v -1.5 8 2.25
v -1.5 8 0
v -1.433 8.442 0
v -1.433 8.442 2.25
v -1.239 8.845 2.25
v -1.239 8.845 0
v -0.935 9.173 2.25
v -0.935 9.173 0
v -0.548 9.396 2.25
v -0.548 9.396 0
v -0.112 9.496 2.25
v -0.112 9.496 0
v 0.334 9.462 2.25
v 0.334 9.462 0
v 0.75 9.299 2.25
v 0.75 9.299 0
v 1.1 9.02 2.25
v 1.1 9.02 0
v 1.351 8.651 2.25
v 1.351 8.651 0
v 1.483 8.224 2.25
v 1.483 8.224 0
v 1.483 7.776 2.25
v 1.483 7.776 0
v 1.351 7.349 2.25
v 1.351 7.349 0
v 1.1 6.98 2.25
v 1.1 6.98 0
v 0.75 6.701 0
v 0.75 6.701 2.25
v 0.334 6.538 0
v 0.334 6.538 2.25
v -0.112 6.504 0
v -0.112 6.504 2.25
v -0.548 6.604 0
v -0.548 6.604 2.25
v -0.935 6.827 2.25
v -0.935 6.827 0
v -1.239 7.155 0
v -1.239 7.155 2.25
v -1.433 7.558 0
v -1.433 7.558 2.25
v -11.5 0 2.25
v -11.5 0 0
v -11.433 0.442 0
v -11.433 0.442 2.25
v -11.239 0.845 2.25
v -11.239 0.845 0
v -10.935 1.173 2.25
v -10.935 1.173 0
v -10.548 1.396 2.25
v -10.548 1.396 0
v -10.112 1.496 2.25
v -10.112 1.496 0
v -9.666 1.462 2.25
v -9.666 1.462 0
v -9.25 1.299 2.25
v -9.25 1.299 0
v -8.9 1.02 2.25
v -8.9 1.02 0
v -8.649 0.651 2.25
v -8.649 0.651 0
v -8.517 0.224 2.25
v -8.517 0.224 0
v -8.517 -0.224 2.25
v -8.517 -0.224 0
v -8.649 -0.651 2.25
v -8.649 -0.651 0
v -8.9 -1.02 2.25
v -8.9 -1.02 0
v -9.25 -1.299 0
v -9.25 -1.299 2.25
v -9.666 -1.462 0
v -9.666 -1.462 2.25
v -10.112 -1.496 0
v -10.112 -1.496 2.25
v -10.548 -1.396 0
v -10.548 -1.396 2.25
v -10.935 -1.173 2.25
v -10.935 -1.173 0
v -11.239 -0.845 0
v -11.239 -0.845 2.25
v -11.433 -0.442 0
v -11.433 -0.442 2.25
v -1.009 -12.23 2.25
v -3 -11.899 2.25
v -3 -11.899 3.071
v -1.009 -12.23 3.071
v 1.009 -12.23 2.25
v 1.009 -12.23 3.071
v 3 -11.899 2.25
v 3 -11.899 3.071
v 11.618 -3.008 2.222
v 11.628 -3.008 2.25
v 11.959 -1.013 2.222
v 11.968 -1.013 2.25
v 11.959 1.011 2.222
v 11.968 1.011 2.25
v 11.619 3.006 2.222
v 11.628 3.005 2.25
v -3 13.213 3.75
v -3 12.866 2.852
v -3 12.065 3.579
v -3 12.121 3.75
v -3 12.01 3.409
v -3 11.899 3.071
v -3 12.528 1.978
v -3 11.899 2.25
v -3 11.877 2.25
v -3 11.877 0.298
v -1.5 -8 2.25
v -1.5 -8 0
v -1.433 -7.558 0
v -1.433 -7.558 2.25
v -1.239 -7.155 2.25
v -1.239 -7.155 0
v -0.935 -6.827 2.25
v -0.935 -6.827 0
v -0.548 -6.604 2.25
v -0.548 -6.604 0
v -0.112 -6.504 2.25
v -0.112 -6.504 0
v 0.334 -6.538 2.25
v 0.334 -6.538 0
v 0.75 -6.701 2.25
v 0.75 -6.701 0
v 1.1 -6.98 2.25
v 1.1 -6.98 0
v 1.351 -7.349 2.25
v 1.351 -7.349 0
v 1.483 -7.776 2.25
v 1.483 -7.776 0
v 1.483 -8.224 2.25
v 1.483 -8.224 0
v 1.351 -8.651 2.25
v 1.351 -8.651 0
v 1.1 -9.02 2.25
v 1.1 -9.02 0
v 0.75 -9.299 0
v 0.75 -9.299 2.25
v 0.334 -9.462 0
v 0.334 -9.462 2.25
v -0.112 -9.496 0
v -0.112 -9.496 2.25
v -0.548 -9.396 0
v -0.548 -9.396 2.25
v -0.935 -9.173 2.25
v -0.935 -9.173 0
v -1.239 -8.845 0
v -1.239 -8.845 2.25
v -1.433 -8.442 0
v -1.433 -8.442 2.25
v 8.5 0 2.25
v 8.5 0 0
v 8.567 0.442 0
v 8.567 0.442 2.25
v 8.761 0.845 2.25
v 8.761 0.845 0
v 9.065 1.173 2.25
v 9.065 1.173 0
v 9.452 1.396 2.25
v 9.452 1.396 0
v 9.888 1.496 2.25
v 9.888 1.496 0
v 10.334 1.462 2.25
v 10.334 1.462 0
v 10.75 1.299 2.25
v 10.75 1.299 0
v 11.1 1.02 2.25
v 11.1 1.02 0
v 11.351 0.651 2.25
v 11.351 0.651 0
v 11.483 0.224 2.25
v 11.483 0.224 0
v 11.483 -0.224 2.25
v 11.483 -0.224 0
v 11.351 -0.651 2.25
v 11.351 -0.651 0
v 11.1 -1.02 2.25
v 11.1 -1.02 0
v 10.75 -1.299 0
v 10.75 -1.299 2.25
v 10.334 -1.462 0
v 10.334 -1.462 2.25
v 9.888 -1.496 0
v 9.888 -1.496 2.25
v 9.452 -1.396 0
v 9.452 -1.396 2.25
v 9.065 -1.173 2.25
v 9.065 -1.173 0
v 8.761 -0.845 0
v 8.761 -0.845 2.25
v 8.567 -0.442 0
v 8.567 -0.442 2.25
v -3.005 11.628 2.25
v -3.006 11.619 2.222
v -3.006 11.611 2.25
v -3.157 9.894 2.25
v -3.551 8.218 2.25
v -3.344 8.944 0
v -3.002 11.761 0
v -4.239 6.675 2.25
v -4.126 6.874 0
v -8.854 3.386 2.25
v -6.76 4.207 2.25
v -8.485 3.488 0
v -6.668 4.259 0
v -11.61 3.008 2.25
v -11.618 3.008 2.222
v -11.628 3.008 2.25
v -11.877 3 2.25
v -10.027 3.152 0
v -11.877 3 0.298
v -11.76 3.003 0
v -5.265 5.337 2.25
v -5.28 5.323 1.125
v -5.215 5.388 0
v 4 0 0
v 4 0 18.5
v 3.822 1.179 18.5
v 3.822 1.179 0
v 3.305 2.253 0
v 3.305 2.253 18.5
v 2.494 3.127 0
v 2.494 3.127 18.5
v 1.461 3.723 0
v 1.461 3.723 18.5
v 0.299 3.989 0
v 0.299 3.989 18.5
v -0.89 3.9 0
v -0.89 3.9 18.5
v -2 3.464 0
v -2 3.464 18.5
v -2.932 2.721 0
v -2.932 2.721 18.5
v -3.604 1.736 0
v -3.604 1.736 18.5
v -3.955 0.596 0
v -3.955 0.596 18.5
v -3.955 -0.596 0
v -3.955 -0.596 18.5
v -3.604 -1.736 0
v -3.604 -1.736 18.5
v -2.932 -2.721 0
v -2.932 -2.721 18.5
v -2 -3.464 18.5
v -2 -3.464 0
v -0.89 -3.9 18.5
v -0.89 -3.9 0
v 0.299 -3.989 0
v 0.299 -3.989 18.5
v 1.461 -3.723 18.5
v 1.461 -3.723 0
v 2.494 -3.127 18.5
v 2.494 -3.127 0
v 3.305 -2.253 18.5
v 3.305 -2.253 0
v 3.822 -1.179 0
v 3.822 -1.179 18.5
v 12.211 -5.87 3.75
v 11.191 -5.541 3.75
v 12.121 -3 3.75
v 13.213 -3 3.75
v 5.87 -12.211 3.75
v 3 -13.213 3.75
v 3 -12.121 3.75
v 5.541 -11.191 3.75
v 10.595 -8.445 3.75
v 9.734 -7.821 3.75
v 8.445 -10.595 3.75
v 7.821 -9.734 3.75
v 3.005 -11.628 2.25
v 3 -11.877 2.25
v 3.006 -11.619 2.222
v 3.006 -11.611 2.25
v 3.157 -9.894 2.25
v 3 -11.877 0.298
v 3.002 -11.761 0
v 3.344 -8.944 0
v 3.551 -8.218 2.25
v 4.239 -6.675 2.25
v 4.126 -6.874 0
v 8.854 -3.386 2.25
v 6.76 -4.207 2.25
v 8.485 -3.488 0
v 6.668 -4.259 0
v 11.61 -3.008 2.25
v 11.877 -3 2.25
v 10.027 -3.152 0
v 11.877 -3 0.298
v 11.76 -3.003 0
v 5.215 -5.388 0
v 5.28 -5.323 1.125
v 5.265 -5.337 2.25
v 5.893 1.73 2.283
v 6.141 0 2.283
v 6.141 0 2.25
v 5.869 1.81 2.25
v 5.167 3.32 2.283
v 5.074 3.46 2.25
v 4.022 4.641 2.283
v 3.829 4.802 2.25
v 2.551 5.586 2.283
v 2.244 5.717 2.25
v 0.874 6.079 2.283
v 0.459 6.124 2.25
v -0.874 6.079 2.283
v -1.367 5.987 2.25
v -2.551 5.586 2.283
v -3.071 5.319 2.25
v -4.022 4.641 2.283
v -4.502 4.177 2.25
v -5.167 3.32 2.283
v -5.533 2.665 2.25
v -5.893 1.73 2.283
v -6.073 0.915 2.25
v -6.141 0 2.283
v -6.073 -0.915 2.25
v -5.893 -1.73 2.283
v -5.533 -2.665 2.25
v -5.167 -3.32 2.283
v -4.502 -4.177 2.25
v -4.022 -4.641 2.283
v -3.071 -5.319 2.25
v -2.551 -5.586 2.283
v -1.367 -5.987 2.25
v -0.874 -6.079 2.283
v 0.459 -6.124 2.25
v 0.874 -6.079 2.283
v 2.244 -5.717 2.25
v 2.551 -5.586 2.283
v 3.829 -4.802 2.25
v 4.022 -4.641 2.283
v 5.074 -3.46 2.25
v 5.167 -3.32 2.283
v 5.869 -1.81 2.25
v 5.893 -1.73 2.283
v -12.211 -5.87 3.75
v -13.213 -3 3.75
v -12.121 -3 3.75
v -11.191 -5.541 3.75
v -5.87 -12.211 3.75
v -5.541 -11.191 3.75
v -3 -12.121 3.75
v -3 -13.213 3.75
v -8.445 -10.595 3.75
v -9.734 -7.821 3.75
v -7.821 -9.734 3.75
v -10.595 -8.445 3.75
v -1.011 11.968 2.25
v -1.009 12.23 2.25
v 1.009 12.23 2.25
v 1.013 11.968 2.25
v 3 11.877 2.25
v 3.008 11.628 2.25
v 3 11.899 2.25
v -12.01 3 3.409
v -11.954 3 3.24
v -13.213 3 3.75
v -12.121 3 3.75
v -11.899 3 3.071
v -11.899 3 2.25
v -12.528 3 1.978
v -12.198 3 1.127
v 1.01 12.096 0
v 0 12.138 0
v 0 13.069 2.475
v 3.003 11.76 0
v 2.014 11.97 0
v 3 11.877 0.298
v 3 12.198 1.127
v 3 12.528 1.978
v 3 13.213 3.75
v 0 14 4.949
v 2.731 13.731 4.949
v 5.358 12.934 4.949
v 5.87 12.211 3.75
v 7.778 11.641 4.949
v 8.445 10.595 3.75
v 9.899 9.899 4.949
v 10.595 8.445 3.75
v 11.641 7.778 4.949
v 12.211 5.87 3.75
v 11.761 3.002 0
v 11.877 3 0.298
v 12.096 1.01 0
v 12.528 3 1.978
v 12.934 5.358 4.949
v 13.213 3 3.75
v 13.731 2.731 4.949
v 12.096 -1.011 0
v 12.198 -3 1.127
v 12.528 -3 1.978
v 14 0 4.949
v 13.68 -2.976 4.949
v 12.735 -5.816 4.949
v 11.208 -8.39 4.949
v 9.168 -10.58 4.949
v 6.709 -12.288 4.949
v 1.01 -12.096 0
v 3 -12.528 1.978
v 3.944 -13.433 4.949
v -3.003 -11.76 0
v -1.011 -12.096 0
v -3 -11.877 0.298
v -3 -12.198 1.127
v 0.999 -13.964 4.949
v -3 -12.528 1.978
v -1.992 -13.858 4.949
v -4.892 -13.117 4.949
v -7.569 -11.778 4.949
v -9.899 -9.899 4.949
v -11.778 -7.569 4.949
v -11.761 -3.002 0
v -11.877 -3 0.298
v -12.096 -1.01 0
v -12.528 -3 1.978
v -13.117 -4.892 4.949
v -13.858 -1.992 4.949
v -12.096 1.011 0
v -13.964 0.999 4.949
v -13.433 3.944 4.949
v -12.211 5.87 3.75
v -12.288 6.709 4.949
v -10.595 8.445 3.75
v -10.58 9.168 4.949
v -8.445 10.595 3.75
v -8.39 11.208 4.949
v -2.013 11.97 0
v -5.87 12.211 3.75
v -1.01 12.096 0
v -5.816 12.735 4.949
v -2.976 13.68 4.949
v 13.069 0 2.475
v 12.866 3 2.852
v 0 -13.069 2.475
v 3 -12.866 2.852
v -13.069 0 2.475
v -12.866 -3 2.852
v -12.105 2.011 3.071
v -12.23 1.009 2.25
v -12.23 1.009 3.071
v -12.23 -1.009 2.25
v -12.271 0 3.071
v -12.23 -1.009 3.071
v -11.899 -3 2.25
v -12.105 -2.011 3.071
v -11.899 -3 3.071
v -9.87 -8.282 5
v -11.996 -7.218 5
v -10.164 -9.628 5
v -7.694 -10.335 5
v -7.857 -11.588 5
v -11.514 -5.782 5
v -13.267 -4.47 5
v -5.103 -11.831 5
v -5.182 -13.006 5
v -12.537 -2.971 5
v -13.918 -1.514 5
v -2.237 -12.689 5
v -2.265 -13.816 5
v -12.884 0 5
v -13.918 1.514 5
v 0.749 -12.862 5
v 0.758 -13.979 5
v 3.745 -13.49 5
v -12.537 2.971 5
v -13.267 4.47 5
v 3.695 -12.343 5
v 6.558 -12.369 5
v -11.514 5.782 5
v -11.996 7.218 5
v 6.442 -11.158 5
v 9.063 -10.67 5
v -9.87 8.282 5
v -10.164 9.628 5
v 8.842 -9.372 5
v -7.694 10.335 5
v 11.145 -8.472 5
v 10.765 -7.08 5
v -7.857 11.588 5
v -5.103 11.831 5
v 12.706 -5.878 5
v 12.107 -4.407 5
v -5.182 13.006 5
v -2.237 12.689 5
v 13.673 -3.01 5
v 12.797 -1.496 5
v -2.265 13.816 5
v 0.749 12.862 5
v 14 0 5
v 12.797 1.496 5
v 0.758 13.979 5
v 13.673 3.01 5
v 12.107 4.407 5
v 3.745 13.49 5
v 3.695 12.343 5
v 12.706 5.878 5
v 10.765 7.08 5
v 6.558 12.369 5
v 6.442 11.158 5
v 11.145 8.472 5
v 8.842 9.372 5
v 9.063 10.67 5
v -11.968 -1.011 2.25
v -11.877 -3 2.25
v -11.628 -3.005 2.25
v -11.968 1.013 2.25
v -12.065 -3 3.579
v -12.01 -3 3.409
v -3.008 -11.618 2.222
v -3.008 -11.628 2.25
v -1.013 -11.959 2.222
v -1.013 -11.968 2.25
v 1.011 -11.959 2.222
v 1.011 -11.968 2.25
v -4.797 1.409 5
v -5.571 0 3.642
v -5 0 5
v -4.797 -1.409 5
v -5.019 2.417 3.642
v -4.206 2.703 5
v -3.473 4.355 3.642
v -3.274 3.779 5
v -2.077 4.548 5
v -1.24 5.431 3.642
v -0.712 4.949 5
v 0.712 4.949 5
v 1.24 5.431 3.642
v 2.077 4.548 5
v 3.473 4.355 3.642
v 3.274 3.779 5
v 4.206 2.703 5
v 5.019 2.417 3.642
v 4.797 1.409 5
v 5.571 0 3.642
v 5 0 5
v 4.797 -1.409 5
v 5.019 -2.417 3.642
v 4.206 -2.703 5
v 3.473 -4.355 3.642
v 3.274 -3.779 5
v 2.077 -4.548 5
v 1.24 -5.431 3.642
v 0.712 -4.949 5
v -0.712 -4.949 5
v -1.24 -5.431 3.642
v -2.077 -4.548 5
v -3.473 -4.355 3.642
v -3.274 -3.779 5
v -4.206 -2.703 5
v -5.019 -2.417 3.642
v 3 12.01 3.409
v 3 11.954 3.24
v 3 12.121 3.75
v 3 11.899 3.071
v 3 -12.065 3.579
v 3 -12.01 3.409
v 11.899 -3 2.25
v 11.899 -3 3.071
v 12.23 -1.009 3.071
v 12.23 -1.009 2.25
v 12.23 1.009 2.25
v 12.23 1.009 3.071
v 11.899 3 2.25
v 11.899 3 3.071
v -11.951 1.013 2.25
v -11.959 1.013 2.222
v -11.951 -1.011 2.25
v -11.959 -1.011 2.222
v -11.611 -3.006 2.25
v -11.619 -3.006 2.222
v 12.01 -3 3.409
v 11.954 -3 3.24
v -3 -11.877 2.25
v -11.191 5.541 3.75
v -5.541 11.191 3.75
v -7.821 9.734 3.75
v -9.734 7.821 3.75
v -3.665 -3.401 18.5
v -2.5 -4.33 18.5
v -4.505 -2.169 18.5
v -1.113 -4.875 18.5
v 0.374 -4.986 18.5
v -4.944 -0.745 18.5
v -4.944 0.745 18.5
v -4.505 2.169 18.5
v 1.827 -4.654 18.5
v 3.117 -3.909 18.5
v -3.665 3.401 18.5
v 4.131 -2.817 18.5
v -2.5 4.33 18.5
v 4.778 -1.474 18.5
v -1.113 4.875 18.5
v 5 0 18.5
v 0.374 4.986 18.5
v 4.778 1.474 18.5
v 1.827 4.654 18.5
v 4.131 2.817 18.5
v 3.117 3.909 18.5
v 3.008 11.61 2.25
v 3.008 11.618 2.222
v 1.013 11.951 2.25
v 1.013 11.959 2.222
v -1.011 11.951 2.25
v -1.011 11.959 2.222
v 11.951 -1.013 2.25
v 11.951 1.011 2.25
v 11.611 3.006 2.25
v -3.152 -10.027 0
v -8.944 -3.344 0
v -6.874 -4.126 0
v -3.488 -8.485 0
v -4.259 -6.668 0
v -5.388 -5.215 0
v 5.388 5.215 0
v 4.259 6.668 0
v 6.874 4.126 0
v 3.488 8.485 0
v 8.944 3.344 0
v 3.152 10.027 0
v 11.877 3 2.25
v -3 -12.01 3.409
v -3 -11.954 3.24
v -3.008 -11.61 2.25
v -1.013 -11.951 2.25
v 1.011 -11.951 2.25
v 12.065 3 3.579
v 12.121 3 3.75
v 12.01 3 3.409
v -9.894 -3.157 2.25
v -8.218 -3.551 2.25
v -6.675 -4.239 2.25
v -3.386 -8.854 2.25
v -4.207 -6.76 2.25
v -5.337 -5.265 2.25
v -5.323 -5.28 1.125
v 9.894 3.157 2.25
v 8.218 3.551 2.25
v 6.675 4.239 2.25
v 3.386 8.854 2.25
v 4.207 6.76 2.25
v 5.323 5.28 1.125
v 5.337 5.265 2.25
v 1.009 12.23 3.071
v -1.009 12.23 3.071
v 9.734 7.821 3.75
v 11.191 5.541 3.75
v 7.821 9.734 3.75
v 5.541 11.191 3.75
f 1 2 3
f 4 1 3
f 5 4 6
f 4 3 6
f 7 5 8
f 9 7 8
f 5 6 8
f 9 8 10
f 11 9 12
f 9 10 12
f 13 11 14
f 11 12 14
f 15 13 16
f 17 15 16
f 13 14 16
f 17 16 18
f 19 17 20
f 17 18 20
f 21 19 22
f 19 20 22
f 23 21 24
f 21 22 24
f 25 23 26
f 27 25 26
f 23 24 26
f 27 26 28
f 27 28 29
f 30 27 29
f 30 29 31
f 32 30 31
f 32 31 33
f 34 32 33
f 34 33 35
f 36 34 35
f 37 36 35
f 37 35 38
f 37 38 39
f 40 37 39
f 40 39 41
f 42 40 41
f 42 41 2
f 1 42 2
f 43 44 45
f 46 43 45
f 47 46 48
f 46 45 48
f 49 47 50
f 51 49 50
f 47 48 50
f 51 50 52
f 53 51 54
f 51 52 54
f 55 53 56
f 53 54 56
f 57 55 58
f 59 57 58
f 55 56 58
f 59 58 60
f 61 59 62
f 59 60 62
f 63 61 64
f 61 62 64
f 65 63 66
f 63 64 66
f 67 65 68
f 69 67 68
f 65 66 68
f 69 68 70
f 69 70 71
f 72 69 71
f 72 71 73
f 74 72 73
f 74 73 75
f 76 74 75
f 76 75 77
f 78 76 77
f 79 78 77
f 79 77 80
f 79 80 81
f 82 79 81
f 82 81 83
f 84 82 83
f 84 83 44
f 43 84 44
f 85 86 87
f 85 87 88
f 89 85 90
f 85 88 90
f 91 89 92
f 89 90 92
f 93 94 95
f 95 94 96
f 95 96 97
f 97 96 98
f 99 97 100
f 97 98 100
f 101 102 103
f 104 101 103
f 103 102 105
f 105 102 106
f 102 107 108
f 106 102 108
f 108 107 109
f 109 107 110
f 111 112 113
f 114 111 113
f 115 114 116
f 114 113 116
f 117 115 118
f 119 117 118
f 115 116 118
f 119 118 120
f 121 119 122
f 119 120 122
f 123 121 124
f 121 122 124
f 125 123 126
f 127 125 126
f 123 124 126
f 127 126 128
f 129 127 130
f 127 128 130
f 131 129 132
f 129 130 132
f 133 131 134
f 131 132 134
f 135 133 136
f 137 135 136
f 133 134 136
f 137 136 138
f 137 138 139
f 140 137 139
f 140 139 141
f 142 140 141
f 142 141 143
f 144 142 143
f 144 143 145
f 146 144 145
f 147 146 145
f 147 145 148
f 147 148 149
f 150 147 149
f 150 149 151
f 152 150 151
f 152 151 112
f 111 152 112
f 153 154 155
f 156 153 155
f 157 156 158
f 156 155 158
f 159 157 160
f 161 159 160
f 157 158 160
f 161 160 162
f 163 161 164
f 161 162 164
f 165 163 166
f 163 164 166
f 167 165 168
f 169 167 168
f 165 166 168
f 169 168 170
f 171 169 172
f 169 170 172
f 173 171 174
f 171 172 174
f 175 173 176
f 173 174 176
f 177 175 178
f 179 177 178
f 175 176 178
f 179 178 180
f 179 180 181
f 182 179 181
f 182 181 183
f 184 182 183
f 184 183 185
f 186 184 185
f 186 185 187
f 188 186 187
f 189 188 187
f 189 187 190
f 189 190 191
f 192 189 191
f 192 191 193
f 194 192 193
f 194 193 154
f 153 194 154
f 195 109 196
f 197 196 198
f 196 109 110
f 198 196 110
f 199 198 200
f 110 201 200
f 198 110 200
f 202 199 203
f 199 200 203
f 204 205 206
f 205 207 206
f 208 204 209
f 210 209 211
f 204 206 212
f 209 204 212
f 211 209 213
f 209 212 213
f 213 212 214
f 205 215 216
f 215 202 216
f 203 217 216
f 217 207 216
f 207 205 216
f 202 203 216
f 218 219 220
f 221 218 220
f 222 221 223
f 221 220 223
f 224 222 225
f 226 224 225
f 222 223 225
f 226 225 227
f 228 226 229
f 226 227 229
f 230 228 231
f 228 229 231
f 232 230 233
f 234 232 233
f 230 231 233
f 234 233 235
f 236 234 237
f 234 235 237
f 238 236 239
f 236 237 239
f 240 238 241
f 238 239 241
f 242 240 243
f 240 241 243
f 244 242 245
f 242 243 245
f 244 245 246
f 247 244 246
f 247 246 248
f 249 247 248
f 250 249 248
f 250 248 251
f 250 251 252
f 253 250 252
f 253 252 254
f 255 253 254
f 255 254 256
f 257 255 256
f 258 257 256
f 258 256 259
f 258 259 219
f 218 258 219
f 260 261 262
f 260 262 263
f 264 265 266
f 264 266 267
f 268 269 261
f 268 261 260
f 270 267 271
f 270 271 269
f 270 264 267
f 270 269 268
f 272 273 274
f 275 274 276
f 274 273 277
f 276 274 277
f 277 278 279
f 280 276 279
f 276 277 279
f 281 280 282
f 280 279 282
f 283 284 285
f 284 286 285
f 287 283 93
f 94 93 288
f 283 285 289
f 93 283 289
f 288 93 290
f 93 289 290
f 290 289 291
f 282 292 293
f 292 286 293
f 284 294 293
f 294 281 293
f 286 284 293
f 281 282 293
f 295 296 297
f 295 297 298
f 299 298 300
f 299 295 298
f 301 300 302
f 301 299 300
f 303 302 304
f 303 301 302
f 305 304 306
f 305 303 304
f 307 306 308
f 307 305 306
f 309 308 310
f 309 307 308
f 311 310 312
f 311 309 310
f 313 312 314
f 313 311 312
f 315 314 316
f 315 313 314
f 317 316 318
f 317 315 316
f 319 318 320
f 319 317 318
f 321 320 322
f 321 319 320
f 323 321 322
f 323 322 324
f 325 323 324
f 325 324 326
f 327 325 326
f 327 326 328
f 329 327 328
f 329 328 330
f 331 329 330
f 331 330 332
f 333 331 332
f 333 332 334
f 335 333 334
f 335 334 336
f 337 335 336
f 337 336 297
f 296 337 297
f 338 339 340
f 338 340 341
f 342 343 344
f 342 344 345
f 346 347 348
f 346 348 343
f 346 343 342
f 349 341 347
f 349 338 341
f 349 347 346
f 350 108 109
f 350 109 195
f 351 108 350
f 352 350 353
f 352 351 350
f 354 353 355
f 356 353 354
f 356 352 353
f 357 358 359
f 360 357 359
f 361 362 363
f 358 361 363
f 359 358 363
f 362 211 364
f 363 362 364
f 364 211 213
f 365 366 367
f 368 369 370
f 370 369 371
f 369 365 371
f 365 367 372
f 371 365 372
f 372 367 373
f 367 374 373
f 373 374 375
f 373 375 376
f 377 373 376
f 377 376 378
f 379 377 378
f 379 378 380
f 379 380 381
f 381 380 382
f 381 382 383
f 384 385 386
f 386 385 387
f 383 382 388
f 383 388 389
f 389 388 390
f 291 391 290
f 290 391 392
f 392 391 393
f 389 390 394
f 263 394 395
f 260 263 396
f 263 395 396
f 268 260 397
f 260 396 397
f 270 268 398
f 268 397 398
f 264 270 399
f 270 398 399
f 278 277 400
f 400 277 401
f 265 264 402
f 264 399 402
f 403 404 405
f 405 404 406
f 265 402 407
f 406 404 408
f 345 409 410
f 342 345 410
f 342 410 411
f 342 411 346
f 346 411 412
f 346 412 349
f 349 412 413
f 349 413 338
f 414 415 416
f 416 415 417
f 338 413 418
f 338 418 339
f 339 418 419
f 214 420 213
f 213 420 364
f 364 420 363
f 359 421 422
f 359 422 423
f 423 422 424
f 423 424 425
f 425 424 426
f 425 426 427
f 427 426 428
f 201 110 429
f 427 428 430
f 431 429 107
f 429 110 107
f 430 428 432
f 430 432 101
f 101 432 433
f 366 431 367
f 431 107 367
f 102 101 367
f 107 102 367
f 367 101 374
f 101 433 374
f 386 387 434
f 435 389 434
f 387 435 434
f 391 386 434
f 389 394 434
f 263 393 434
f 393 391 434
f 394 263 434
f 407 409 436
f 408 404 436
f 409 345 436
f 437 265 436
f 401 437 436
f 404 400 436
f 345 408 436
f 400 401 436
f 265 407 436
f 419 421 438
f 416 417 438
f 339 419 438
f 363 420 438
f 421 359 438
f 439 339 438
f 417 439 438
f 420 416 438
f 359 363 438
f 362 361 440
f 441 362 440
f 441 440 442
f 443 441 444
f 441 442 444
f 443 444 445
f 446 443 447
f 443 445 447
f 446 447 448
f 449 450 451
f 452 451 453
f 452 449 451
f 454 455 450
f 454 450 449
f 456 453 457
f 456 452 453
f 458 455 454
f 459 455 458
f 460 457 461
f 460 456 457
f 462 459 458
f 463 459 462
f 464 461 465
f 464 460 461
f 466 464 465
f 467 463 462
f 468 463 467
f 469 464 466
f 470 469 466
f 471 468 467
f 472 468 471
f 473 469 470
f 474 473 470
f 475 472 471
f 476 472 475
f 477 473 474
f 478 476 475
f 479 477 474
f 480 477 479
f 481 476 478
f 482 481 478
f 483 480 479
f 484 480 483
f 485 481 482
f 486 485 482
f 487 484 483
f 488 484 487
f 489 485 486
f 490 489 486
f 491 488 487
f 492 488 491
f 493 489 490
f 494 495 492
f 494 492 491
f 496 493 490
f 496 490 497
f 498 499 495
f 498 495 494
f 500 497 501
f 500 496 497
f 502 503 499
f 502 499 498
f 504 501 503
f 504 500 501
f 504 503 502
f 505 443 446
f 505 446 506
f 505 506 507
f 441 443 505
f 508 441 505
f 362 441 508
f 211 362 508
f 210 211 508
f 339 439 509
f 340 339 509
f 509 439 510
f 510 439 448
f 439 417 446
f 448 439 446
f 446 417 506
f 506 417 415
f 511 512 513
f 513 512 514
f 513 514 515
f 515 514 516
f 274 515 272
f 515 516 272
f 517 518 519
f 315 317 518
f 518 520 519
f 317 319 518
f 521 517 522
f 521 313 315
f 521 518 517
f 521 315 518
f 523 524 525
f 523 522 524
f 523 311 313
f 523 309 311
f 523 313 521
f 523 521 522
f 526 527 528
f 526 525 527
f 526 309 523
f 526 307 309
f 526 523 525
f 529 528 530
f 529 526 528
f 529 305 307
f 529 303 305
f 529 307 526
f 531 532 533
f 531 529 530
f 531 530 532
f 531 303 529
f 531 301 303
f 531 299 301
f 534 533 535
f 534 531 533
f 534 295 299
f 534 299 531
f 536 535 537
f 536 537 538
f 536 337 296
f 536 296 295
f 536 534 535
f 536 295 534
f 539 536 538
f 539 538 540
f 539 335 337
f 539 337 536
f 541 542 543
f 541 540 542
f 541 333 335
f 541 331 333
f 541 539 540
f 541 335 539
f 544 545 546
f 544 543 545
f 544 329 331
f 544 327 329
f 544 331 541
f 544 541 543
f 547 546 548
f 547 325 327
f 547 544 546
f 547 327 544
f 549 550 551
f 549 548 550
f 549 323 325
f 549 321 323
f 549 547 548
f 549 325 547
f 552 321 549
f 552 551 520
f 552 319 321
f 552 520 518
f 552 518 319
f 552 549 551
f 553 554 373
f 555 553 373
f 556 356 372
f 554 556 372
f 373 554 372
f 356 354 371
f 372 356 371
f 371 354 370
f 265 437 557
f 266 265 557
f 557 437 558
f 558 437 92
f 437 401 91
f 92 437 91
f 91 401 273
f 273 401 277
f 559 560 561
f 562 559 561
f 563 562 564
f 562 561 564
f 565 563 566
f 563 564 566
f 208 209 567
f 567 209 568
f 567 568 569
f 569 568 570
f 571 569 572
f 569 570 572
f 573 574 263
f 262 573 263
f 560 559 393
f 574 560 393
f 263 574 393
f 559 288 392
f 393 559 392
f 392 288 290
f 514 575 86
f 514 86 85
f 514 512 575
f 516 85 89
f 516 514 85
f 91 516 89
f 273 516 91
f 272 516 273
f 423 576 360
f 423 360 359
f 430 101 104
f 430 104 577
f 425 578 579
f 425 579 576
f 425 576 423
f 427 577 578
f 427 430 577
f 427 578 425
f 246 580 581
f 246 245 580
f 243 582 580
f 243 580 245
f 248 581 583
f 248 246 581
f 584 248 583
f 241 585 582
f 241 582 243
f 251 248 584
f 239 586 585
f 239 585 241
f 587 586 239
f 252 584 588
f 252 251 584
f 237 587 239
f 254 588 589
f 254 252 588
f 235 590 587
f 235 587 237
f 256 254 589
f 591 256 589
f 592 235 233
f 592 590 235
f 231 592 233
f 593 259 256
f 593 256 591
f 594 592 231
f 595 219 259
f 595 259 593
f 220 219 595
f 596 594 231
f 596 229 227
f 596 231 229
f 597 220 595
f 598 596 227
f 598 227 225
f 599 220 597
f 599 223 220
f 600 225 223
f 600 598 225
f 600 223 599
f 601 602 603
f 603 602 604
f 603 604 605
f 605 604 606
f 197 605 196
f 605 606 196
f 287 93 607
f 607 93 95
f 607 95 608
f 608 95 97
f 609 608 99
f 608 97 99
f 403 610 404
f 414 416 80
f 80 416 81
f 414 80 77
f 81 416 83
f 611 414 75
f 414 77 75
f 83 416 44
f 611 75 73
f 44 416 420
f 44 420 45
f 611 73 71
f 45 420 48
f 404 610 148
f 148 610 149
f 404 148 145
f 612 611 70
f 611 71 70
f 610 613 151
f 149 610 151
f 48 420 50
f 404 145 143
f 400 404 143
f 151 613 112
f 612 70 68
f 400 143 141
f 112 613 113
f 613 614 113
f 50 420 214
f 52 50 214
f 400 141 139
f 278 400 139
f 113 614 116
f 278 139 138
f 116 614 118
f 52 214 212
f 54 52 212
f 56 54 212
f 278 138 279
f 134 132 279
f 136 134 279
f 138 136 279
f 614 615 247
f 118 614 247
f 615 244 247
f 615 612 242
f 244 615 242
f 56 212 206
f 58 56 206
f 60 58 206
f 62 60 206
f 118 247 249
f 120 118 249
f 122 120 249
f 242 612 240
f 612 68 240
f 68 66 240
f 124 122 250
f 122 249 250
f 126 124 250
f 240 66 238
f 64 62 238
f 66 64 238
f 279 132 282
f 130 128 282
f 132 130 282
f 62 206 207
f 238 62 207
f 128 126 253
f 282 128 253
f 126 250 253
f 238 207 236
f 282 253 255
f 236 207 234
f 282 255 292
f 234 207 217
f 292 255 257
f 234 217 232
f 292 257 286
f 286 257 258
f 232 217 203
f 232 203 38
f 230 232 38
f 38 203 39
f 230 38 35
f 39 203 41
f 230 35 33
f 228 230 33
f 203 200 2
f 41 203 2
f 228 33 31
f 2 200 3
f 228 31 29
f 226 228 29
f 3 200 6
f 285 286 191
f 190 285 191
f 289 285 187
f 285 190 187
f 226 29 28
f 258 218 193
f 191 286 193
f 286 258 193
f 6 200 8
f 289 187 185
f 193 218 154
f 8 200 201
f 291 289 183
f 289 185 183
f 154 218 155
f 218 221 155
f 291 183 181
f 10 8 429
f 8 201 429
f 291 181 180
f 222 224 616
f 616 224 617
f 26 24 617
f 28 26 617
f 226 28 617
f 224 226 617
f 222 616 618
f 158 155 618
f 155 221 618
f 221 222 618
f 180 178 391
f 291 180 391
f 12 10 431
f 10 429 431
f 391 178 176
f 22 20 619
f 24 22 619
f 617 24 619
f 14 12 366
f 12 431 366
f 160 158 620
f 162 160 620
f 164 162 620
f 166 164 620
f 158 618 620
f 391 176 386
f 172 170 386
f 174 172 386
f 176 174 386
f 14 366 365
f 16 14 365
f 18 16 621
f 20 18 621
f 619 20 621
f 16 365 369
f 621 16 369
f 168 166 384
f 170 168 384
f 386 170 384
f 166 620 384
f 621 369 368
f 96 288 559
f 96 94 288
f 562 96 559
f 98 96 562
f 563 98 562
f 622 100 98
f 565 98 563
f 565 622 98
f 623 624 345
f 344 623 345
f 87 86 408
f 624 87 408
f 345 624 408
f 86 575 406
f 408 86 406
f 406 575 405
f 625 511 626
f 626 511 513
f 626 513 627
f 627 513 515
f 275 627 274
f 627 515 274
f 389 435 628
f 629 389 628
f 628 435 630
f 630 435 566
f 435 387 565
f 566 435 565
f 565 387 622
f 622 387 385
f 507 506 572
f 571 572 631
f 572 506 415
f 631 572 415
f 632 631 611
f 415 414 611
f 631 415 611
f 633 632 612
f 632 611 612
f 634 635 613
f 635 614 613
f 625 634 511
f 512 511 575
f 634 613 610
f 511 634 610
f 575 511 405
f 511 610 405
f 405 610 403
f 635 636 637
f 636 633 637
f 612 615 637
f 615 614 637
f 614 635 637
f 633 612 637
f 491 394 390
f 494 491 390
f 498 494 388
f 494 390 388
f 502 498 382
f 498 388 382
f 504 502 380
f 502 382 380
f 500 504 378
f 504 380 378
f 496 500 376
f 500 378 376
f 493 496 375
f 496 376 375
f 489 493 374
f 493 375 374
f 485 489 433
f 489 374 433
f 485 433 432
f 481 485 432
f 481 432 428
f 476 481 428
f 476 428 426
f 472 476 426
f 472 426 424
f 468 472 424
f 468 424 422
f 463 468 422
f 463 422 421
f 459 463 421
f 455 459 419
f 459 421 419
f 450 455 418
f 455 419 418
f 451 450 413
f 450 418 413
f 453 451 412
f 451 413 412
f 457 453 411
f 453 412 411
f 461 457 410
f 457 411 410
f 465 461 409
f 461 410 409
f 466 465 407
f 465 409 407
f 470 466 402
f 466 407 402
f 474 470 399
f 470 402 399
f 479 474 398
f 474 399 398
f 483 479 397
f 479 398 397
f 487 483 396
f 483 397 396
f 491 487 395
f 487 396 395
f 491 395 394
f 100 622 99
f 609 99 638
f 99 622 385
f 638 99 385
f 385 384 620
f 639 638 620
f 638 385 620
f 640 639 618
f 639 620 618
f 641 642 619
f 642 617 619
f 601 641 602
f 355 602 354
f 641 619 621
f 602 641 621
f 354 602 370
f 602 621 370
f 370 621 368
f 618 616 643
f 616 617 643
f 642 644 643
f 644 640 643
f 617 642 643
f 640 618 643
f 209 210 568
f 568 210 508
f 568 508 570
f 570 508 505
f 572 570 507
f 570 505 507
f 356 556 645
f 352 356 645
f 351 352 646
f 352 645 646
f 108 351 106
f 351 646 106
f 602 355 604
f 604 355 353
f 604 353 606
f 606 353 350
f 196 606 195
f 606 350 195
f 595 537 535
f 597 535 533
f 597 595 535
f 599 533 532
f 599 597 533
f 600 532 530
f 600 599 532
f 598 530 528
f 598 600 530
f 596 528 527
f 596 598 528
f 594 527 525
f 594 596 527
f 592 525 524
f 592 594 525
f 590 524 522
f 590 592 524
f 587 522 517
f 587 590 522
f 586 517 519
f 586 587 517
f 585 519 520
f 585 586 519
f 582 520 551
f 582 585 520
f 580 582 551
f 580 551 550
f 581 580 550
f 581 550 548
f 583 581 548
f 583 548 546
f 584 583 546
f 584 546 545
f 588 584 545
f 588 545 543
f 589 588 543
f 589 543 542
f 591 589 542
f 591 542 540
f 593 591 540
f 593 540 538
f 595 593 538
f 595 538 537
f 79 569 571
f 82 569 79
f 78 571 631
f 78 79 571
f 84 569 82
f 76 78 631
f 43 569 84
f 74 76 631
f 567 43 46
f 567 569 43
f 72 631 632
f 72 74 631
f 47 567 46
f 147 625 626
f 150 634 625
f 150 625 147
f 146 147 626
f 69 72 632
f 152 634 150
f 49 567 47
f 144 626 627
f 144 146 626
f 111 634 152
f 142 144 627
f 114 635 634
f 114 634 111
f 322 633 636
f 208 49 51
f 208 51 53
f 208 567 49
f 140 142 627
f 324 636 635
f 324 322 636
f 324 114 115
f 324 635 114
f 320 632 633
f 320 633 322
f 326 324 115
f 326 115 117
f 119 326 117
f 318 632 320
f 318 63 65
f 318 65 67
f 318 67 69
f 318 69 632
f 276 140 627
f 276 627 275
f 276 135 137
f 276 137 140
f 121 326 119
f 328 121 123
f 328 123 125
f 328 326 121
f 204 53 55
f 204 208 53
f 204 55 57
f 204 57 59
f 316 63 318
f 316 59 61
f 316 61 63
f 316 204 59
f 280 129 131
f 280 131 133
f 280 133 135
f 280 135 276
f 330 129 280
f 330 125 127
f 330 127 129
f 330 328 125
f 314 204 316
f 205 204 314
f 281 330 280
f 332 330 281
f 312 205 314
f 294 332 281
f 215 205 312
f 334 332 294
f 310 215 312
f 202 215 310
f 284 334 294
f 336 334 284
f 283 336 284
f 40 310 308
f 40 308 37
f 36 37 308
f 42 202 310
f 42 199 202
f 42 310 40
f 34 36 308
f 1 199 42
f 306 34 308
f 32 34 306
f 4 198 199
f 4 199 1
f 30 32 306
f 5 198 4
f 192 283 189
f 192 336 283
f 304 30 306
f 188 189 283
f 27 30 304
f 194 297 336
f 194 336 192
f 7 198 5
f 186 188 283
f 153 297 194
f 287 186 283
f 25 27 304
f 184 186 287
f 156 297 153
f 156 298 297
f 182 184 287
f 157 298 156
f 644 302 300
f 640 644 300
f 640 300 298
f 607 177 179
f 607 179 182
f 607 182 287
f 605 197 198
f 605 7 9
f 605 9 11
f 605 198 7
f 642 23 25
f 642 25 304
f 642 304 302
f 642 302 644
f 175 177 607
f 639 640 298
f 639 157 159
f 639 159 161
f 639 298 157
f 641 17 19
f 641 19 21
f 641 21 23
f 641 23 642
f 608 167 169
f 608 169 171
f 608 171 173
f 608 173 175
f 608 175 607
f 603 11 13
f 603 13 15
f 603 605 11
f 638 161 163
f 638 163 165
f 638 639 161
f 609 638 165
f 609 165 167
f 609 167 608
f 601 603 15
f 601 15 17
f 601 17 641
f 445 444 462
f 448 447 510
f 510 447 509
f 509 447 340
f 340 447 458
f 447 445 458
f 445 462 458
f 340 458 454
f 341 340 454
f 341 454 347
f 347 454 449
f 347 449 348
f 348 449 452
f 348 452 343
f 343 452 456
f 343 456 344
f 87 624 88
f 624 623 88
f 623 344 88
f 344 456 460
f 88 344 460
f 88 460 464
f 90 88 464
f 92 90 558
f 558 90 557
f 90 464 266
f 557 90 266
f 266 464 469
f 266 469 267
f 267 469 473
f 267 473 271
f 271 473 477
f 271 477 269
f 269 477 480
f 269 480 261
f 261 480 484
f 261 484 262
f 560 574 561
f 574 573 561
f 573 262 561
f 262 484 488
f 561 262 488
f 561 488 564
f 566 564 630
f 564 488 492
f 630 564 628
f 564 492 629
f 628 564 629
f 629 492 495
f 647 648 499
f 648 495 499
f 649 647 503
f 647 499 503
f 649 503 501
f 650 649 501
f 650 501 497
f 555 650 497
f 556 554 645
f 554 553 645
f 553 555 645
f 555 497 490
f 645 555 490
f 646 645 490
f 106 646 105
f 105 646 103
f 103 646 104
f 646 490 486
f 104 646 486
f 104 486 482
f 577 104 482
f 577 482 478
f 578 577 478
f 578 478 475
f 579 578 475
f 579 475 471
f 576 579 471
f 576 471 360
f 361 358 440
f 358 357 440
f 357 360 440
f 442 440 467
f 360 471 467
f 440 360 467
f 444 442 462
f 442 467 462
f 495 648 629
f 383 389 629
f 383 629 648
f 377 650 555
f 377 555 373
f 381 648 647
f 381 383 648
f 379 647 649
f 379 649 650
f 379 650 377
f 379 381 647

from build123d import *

# Parameters (mm, degrees)
SKETCH1_R           = 14
BOSS_EXTRUDE1_DEPTH = 18.5
SKETCH2_R           = 14
SKETCH2_R_2         = 5
CUT_EXTRUDE1_DEPTH  = 13.5
SKETCH3_R           = 4
CUT_EXTRUDE2_DEPTH  = 22.5
CUT_EXTRUDE3_DEPTH  = 3.75
SKETCH8_R           = 12.271364757
SKETCH8_R_2         = 6.141449245
CUT_EXTRUDE4_DEPTH  = 2.75
CIRPATTERN1_COUNT   = 4
SKETCH11_R          = 1.5
CUT_EXTRUDE5_DEPTH  = 3


with BuildPart() as part:
    # Sketch1 → Boss-Extrude1 (new body)
    with BuildSketch(Plane.XY):
        Circle(SKETCH1_R)
    extrude(amount=BOSS_EXTRUDE1_DEPTH)

    # Sketch2 → Cut-Extrude1 (cut)
    with BuildSketch(Plane.XY.offset(18.5)):
        Circle(SKETCH2_R)
        Circle(SKETCH2_R_2, mode=Mode.SUBTRACT)
    extrude(amount=-CUT_EXTRUDE1_DEPTH, mode=Mode.SUBTRACT)

    # Sketch3 → Cut-Extrude2 (cut)
    with BuildSketch(Plane.XY.offset(18.5)):
        Circle(SKETCH3_R)
    extrude(amount=-CUT_EXTRUDE2_DEPTH, mode=Mode.SUBTRACT)

    # Sketch6 → Cut-Revolve1 (revolve, cut)
    with BuildSketch(Plane(origin=(0, 0, 0), x_dir=(0, 0, -1), z_dir=(1, 0, 0))):
        Polygon((-4.949121361, 14), (3.777639186, 16.199586118), (5.061522468, 10.233304984), align=None)
    revolve(axis=Axis((0, 0, 19.921792725), (0, 0, -1)), mode=Mode.SUBTRACT)

    # Sketch7 → Cut-Extrude3 (cut)
    with BuildSketch(Plane(origin=(0, 0, 0), x_dir=(-1, 0, 0), z_dir=(0, 0, -1))):
        with BuildLine():
            Line((3, 15.639460569), (3, 11.87697352))
            add(Edge.make_bspline(
                [(3, 11.87697352), (3.121054504, 3.206614769), (11.87697352, 3)],
                knots=[0, 0, 0, 1, 1, 1], degree=2))
            Line((11.87697352, 3), (17.86108213, 3))
            Line((17.86108213, 3), (14.869027825, 14.316513241))
            Line((14.869027825, 14.316513241), (3, 15.639460569))
        make_face()
    cut_extrude3 = extrude(amount=-CUT_EXTRUDE3_DEPTH, mode=Mode.SUBTRACT)

    # Sketch8 → Cut-Extrude4 (cut)
    with BuildSketch(Plane.XY.offset(5)):
        Circle(SKETCH8_R)
        Circle(SKETCH8_R_2, mode=Mode.SUBTRACT)
    extrude(amount=-CUT_EXTRUDE4_DEPTH, mode=Mode.SUBTRACT)

    # Sketch9 → Cut-Revolve2 (revolve, cut)
    with BuildSketch(Plane(origin=(0, 0, 0), x_dir=(1, 0, 0), z_dir=(0, 1, 0))):
        Polygon((-12.001476603, -2.22152714), (-13.001507243, -5.36905248), (-11.155114973, -5.36905248), align=None)
    revolve(axis=Axis((0, 0, -1.742471472), (0, 0, 1)), mode=Mode.SUBTRACT)

    # Sketch10 → Cut-Revolve3 (revolve, cut)
    with BuildSketch(Plane(origin=(0, 0, 0), x_dir=(1, 0, 0), z_dir=(0, 1, 0))):
        Polygon((-5, -5), (-6.141449245, -2.28305418), (-6.572257958, -5.413209842), align=None)
    revolve(axis=Axis((0, 0, 0), (0, 0, -1)), mode=Mode.SUBTRACT)

    # CirPattern1: Cut-Extrude3 ×4 about axis
    cirpattern1_axis = Axis((0, 0, 3.75), (0, 0, 1))
    for i in range(1, CIRPATTERN1_COUNT):
        add(cut_extrude3.rotate(cirpattern1_axis, i * 360 / CIRPATTERN1_COUNT), mode=Mode.SUBTRACT)

    # Sketch11 → Cut-Extrude5 (cut)
    with BuildSketch(Plane(origin=(0, 0, 0), x_dir=(-1, 0, 0), z_dir=(0, 0, -1))):
        with Locations((0, 8)):
            Circle(SKETCH11_R)
        with Locations((0, -8)):
            Circle(SKETCH11_R)
        with Locations((-10, 0)):
            Circle(SKETCH11_R)
        with Locations((10, 0)):
            Circle(SKETCH11_R)
    extrude(amount=-CUT_EXTRUDE5_DEPTH, mode=Mode.SUBTRACT)


solid = part.part
